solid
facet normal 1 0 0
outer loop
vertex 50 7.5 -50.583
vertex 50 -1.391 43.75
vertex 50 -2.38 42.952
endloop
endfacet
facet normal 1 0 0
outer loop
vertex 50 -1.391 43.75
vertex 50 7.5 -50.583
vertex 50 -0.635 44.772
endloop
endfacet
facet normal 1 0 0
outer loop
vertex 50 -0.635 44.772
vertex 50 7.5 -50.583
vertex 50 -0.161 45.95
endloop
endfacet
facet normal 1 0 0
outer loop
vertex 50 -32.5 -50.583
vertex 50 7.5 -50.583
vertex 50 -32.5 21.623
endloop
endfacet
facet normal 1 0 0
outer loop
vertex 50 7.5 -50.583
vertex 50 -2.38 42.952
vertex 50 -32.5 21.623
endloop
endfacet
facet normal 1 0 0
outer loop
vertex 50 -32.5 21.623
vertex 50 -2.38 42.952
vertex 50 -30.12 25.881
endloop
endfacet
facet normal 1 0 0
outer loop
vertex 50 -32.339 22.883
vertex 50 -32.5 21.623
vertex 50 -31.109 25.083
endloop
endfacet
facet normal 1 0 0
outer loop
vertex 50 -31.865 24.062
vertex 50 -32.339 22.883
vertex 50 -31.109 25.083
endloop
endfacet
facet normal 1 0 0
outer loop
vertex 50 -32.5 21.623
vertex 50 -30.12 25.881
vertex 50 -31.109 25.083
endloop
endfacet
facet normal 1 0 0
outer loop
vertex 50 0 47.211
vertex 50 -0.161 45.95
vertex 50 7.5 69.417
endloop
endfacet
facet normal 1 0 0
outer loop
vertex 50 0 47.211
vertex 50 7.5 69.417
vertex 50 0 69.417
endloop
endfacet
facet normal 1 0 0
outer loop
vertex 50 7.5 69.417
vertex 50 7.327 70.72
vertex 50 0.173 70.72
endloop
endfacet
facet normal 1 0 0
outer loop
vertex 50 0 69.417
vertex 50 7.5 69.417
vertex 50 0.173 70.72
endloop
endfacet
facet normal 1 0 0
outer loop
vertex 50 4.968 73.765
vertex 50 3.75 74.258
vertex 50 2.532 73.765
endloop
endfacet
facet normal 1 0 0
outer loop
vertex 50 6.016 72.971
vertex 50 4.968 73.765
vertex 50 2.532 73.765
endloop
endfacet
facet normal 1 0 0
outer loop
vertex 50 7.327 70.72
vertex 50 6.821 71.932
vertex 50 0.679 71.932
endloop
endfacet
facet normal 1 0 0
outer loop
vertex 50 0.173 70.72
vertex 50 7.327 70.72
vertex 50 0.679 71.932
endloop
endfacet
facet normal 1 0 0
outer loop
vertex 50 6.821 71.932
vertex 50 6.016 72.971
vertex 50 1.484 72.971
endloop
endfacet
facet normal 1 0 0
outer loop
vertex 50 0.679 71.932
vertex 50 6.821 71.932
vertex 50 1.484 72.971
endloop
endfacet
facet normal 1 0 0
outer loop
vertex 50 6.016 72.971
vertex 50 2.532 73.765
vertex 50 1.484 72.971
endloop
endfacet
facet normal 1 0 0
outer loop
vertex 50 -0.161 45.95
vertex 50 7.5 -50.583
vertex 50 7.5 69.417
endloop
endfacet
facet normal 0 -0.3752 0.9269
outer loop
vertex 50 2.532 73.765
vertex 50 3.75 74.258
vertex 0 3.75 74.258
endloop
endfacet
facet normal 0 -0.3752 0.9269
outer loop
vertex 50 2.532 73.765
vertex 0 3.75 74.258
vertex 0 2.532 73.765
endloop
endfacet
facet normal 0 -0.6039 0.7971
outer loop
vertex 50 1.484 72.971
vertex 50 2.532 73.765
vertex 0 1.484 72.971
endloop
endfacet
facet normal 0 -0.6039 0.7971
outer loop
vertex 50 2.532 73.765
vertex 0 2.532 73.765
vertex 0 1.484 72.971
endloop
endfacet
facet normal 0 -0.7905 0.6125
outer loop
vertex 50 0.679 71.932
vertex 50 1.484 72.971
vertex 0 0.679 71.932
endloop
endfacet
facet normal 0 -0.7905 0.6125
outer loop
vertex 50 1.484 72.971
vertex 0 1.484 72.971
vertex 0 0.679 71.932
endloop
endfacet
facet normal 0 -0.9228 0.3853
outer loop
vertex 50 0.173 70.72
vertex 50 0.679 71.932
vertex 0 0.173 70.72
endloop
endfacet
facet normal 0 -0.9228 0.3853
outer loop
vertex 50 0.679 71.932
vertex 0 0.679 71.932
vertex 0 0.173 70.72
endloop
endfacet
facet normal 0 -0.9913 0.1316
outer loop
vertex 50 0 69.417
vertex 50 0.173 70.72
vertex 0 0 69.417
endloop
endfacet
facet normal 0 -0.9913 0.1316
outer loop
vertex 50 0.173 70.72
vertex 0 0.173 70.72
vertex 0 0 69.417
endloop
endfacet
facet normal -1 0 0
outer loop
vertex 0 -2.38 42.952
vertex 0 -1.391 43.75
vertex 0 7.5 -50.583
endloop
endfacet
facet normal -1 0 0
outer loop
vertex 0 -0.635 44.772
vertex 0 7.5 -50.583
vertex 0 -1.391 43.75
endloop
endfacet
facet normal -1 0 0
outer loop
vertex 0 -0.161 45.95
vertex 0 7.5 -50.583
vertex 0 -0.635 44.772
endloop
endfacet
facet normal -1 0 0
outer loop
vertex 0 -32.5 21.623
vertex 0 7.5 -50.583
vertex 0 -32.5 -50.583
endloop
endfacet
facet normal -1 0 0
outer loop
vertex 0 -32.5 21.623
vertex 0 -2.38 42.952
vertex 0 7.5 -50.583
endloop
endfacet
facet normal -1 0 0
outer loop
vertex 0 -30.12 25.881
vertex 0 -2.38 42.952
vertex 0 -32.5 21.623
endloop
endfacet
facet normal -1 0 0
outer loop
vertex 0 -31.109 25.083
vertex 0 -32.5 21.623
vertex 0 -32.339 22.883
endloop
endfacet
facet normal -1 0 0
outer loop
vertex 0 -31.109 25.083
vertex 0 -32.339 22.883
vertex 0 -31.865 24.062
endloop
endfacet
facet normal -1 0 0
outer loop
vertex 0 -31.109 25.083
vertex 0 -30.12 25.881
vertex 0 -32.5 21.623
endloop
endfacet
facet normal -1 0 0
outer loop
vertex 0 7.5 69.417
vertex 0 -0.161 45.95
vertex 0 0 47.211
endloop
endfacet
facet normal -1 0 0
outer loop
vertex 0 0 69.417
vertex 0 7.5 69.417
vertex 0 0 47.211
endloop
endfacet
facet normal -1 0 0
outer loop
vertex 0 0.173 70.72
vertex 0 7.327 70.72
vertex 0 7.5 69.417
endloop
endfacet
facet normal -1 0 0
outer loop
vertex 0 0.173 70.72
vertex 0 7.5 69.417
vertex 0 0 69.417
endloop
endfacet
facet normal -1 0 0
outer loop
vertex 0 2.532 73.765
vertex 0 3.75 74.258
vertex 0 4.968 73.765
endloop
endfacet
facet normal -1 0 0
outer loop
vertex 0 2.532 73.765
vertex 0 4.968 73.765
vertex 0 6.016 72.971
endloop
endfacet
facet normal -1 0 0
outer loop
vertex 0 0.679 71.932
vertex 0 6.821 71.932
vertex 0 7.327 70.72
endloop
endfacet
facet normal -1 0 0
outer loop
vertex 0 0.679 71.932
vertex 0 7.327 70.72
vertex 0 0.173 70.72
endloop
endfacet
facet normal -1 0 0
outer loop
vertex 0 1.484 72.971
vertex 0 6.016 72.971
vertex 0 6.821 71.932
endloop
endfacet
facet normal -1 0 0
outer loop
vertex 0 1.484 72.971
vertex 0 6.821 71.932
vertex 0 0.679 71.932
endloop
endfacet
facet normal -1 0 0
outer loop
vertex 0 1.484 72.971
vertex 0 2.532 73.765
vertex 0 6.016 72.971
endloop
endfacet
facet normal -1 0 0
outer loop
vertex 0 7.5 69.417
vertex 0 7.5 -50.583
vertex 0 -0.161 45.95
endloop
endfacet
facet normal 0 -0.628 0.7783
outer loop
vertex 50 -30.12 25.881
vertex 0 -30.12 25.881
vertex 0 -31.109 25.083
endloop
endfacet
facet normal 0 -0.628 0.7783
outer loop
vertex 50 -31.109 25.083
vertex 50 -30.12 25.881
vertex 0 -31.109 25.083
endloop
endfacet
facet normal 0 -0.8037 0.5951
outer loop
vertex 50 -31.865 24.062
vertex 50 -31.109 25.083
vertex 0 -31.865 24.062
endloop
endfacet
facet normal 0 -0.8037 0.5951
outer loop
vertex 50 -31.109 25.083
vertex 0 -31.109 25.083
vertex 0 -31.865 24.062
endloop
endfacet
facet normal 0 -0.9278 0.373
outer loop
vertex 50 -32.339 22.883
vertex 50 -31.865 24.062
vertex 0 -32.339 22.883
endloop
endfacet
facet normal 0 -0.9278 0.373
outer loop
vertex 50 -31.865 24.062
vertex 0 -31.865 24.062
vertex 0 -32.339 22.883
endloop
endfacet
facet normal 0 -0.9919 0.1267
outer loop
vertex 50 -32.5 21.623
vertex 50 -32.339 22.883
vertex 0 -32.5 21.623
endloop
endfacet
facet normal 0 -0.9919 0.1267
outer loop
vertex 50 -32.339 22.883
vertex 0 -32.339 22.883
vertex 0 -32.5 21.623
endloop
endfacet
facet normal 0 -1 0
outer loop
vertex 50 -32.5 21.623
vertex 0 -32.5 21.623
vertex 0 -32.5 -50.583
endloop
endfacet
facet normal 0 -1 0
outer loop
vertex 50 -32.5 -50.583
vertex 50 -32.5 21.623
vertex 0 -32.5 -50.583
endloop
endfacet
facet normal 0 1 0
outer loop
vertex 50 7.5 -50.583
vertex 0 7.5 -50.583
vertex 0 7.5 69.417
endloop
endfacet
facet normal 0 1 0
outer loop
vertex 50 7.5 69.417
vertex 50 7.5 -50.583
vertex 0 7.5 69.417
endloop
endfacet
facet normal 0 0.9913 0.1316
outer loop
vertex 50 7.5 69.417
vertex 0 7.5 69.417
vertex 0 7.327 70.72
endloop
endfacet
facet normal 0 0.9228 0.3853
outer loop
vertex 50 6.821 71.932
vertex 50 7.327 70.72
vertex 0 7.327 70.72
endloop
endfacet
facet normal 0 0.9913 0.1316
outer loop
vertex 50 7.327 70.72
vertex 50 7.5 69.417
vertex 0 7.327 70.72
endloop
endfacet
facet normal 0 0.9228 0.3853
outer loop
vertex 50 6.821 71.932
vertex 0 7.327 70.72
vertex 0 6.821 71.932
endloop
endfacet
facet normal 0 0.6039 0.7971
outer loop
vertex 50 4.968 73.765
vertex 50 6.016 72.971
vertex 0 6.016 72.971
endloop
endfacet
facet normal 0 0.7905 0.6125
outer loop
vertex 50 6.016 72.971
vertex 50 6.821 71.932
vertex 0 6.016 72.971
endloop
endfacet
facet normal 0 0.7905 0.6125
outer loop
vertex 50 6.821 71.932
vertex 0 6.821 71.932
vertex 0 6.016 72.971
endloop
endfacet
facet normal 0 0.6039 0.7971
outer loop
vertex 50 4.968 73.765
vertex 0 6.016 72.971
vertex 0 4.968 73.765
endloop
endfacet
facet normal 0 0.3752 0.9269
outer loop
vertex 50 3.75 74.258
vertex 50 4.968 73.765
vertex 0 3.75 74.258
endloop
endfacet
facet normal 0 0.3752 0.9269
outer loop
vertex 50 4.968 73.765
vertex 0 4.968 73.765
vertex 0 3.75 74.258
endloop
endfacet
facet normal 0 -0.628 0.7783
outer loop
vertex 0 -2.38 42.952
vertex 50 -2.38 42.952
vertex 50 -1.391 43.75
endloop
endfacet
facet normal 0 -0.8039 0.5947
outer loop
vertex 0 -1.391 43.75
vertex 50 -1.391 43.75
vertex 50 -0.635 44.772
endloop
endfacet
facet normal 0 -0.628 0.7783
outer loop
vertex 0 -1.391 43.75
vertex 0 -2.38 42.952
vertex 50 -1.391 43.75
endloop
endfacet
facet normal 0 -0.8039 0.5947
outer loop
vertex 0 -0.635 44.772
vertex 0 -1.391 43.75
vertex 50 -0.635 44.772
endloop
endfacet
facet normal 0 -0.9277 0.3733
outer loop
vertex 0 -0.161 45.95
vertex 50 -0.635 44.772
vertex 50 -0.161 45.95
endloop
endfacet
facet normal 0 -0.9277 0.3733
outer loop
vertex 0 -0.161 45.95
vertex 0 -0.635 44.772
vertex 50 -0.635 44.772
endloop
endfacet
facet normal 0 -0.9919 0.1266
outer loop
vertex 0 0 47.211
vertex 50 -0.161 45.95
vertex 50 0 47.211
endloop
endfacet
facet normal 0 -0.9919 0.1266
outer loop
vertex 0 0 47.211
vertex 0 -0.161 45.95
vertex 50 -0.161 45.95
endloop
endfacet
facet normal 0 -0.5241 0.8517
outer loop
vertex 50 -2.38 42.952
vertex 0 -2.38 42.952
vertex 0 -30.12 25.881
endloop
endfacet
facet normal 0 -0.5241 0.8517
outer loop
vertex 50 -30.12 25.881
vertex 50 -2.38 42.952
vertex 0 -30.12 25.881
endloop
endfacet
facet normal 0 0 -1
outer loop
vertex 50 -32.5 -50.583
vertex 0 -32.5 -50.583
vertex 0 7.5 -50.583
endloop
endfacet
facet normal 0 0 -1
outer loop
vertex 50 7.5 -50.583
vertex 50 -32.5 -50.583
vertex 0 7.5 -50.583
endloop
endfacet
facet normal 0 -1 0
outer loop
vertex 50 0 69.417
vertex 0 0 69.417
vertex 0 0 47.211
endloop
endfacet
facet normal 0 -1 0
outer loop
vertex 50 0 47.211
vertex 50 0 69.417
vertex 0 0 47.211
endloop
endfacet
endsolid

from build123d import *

# Parameters (mm, degrees)
F1_DEPTH    = 50
F2_T1_DEPTH = 50
F2_T3_DEPTH = 75
F2_T5_DEPTH = 63.9698798509


# Not quite as in the source:
# - a fillet or chamfer that OpenCascade refuses, or shapes differently, is made with other operations: its cross-section is extruded or revolved along the edge and cut away or added


with BuildPart() as f1:
    # F0 (on Right) → F1 (new body)
    with BuildSketch(Plane.YZ):
        Polygon((-32.5, 24.4166636232), (-32.5, -50.5833363768), (7.5, -50.5833363768), (7.5, 74.4166636232), (0, 74.4166636232), (0, 44.4166636232), align=None)
    extrude(amount=F1_DEPTH)

    # F2: fillet of radius 5 on 4 edges, made by hand

    # F2_s2 → F2_t1 (join)
    with BuildSketch(Plane.YZ):
        with BuildLine():
            ThreePointArc((-2.3795128717, 42.9523480098), (-0.6352299235, 44.7716270515), (0, 47.2106395933))
            Line((0, 47.2106395933), (0, 44.4166636232))
            Line((0, 44.4166636232), (-2.3795128717, 42.9523480098))
        make_face()
    extrude(amount=F2_T1_DEPTH)

    # F2_s4 → F2_t3 (cut)
    with BuildSketch(Plane.YZ.offset(-12.5)):
        with BuildLine():
            ThreePointArc((5, 74.4166636232), (1.4644660941, 72.9521975291), (0, 69.4166636232))
            Line((0, 69.4166636232), (0, 74.4166636232))
            Line((0, 74.4166636232), (5, 74.4166636232))
        make_face()
        with BuildLine():
            ThreePointArc((7.5, 69.4166636232), (6.0355339059, 72.9521975291), (2.5, 74.4166636232))
            Line((2.5, 74.4166636232), (7.5, 74.4166636232))
            Line((7.5, 74.4166636232), (7.5, 69.4166636232))
        make_face()
    extrude(amount=F2_T3_DEPTH, mode=Mode.SUBTRACT)

    # F2_s6 → F2_t5 (cut)
    with BuildSketch(Plane.YZ.offset(-6.9849399255)):
        with BuildLine():
            ThreePointArc((-30.1204871283, 25.8809792365), (-31.8647700765, 24.0617001948), (-32.5, 21.622687653))
            Line((-32.5, 21.622687653), (-32.5, 24.4166636232))
            Line((-32.5, 24.4166636232), (-30.1204871283, 25.8809792365))
        make_face()
    extrude(amount=F2_T5_DEPTH, mode=Mode.SUBTRACT)


solid = f1.part
